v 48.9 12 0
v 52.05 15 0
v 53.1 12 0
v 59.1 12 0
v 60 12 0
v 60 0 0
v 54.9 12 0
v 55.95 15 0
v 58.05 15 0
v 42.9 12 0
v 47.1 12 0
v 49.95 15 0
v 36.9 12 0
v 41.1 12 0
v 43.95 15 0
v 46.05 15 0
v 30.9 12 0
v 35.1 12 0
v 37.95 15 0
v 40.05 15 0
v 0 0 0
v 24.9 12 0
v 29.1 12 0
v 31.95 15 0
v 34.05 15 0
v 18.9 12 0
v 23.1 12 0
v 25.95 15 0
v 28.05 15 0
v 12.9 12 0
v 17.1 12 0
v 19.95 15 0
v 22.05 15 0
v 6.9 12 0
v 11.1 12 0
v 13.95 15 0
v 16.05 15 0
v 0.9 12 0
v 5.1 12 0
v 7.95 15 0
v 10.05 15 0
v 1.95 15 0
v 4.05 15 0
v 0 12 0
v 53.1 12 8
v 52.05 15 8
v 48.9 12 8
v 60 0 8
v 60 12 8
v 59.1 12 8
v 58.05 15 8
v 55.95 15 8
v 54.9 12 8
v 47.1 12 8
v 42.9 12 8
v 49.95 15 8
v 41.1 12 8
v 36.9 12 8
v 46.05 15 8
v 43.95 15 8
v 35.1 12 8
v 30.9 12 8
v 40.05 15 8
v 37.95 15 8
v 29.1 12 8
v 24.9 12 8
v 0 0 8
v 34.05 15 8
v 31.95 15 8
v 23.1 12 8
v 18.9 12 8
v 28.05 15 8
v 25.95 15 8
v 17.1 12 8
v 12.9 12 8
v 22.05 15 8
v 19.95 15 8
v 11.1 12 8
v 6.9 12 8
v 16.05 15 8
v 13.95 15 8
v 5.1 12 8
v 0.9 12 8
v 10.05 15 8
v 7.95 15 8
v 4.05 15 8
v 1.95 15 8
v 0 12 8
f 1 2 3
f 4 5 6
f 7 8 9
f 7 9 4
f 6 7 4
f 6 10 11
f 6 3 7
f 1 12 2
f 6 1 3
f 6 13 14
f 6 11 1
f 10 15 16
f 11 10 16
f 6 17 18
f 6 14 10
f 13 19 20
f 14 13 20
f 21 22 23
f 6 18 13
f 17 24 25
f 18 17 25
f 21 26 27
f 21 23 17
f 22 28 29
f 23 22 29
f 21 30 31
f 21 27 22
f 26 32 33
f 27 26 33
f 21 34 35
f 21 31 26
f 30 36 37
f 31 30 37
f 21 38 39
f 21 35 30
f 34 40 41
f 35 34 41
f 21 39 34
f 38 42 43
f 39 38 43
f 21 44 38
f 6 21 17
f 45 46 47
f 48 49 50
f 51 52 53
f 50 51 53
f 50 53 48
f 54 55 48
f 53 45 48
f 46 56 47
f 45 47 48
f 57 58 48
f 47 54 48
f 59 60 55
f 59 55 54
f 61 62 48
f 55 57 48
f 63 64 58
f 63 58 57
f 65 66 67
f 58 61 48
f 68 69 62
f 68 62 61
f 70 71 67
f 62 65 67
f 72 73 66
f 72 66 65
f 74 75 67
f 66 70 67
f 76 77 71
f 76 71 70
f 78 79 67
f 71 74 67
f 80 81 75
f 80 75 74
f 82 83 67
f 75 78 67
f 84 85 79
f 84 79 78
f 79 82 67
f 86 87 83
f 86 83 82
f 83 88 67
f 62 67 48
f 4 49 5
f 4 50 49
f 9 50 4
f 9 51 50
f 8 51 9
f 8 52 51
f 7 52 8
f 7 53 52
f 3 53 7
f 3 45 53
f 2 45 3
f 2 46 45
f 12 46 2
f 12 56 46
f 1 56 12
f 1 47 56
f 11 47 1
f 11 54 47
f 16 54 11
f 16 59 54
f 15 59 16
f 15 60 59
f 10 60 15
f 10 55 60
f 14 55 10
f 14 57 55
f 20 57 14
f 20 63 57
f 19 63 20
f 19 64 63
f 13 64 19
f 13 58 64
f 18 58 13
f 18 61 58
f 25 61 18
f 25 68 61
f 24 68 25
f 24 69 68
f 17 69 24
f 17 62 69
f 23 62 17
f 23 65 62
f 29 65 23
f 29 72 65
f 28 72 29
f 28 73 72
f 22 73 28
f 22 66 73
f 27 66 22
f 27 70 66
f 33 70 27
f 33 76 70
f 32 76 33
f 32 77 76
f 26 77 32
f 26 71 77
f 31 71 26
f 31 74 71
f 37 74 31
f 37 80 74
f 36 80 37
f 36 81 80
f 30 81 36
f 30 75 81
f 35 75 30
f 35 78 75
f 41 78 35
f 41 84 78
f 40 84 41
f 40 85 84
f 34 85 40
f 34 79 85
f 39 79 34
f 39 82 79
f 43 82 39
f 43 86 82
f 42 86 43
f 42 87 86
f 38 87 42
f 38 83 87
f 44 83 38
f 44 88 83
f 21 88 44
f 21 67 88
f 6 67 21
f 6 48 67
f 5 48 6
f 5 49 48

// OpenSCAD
$fn = 32;

// ----------------------------------------------------------------------
// Gear rack: 10 teeth, pitch 6 mm
// ----------------------------------------------------------------------

// --- parameters (mm) ---
teeth = 10;               // number of teeth
pitch = 6;                // tooth pitch, X
root_w = 4.2;             // tooth width at the root
tip_w = 2.1;              // tooth width at the tip
base_h = 12;              // rack body height, Y
tooth_h = 3;              // tooth height above the body
plate_t = 8;              // rack width, Z (extrusion height)

rack_l = teeth * pitch;  // overall length
total_h = base_h + tooth_h;  // overall height

profile = [[0, 0], [60, 0], [60, 12], [59.1, 12], [58.05, 15], [55.95, 15], [54.9, 12], [53.1, 12], [52.05, 15], [49.95, 15], [48.9, 12], [47.1, 12], [46.05, 15], [43.95, 15], [42.9, 12], [41.1, 12], [40.05, 15], [37.95, 15], [36.9, 12], [35.1, 12], [34.05, 15], [31.95, 15], [30.9, 12], [29.1, 12], [28.05, 15], [25.95, 15], [24.9, 12], [23.1, 12], [22.05, 15], [19.95, 15], [18.9, 12], [17.1, 12], [16.05, 15], [13.95, 15], [12.9, 12], [11.1, 12], [10.05, 15], [7.95, 15], [6.9, 12], [5.1, 12], [4.05, 15], [1.95, 15], [0.9, 12], [0, 12]];  // primary outline, 44 points, counter clockwise

// --- the one profile operation ---
linear_extrude(height = plate_t) polygon(points = profile);
